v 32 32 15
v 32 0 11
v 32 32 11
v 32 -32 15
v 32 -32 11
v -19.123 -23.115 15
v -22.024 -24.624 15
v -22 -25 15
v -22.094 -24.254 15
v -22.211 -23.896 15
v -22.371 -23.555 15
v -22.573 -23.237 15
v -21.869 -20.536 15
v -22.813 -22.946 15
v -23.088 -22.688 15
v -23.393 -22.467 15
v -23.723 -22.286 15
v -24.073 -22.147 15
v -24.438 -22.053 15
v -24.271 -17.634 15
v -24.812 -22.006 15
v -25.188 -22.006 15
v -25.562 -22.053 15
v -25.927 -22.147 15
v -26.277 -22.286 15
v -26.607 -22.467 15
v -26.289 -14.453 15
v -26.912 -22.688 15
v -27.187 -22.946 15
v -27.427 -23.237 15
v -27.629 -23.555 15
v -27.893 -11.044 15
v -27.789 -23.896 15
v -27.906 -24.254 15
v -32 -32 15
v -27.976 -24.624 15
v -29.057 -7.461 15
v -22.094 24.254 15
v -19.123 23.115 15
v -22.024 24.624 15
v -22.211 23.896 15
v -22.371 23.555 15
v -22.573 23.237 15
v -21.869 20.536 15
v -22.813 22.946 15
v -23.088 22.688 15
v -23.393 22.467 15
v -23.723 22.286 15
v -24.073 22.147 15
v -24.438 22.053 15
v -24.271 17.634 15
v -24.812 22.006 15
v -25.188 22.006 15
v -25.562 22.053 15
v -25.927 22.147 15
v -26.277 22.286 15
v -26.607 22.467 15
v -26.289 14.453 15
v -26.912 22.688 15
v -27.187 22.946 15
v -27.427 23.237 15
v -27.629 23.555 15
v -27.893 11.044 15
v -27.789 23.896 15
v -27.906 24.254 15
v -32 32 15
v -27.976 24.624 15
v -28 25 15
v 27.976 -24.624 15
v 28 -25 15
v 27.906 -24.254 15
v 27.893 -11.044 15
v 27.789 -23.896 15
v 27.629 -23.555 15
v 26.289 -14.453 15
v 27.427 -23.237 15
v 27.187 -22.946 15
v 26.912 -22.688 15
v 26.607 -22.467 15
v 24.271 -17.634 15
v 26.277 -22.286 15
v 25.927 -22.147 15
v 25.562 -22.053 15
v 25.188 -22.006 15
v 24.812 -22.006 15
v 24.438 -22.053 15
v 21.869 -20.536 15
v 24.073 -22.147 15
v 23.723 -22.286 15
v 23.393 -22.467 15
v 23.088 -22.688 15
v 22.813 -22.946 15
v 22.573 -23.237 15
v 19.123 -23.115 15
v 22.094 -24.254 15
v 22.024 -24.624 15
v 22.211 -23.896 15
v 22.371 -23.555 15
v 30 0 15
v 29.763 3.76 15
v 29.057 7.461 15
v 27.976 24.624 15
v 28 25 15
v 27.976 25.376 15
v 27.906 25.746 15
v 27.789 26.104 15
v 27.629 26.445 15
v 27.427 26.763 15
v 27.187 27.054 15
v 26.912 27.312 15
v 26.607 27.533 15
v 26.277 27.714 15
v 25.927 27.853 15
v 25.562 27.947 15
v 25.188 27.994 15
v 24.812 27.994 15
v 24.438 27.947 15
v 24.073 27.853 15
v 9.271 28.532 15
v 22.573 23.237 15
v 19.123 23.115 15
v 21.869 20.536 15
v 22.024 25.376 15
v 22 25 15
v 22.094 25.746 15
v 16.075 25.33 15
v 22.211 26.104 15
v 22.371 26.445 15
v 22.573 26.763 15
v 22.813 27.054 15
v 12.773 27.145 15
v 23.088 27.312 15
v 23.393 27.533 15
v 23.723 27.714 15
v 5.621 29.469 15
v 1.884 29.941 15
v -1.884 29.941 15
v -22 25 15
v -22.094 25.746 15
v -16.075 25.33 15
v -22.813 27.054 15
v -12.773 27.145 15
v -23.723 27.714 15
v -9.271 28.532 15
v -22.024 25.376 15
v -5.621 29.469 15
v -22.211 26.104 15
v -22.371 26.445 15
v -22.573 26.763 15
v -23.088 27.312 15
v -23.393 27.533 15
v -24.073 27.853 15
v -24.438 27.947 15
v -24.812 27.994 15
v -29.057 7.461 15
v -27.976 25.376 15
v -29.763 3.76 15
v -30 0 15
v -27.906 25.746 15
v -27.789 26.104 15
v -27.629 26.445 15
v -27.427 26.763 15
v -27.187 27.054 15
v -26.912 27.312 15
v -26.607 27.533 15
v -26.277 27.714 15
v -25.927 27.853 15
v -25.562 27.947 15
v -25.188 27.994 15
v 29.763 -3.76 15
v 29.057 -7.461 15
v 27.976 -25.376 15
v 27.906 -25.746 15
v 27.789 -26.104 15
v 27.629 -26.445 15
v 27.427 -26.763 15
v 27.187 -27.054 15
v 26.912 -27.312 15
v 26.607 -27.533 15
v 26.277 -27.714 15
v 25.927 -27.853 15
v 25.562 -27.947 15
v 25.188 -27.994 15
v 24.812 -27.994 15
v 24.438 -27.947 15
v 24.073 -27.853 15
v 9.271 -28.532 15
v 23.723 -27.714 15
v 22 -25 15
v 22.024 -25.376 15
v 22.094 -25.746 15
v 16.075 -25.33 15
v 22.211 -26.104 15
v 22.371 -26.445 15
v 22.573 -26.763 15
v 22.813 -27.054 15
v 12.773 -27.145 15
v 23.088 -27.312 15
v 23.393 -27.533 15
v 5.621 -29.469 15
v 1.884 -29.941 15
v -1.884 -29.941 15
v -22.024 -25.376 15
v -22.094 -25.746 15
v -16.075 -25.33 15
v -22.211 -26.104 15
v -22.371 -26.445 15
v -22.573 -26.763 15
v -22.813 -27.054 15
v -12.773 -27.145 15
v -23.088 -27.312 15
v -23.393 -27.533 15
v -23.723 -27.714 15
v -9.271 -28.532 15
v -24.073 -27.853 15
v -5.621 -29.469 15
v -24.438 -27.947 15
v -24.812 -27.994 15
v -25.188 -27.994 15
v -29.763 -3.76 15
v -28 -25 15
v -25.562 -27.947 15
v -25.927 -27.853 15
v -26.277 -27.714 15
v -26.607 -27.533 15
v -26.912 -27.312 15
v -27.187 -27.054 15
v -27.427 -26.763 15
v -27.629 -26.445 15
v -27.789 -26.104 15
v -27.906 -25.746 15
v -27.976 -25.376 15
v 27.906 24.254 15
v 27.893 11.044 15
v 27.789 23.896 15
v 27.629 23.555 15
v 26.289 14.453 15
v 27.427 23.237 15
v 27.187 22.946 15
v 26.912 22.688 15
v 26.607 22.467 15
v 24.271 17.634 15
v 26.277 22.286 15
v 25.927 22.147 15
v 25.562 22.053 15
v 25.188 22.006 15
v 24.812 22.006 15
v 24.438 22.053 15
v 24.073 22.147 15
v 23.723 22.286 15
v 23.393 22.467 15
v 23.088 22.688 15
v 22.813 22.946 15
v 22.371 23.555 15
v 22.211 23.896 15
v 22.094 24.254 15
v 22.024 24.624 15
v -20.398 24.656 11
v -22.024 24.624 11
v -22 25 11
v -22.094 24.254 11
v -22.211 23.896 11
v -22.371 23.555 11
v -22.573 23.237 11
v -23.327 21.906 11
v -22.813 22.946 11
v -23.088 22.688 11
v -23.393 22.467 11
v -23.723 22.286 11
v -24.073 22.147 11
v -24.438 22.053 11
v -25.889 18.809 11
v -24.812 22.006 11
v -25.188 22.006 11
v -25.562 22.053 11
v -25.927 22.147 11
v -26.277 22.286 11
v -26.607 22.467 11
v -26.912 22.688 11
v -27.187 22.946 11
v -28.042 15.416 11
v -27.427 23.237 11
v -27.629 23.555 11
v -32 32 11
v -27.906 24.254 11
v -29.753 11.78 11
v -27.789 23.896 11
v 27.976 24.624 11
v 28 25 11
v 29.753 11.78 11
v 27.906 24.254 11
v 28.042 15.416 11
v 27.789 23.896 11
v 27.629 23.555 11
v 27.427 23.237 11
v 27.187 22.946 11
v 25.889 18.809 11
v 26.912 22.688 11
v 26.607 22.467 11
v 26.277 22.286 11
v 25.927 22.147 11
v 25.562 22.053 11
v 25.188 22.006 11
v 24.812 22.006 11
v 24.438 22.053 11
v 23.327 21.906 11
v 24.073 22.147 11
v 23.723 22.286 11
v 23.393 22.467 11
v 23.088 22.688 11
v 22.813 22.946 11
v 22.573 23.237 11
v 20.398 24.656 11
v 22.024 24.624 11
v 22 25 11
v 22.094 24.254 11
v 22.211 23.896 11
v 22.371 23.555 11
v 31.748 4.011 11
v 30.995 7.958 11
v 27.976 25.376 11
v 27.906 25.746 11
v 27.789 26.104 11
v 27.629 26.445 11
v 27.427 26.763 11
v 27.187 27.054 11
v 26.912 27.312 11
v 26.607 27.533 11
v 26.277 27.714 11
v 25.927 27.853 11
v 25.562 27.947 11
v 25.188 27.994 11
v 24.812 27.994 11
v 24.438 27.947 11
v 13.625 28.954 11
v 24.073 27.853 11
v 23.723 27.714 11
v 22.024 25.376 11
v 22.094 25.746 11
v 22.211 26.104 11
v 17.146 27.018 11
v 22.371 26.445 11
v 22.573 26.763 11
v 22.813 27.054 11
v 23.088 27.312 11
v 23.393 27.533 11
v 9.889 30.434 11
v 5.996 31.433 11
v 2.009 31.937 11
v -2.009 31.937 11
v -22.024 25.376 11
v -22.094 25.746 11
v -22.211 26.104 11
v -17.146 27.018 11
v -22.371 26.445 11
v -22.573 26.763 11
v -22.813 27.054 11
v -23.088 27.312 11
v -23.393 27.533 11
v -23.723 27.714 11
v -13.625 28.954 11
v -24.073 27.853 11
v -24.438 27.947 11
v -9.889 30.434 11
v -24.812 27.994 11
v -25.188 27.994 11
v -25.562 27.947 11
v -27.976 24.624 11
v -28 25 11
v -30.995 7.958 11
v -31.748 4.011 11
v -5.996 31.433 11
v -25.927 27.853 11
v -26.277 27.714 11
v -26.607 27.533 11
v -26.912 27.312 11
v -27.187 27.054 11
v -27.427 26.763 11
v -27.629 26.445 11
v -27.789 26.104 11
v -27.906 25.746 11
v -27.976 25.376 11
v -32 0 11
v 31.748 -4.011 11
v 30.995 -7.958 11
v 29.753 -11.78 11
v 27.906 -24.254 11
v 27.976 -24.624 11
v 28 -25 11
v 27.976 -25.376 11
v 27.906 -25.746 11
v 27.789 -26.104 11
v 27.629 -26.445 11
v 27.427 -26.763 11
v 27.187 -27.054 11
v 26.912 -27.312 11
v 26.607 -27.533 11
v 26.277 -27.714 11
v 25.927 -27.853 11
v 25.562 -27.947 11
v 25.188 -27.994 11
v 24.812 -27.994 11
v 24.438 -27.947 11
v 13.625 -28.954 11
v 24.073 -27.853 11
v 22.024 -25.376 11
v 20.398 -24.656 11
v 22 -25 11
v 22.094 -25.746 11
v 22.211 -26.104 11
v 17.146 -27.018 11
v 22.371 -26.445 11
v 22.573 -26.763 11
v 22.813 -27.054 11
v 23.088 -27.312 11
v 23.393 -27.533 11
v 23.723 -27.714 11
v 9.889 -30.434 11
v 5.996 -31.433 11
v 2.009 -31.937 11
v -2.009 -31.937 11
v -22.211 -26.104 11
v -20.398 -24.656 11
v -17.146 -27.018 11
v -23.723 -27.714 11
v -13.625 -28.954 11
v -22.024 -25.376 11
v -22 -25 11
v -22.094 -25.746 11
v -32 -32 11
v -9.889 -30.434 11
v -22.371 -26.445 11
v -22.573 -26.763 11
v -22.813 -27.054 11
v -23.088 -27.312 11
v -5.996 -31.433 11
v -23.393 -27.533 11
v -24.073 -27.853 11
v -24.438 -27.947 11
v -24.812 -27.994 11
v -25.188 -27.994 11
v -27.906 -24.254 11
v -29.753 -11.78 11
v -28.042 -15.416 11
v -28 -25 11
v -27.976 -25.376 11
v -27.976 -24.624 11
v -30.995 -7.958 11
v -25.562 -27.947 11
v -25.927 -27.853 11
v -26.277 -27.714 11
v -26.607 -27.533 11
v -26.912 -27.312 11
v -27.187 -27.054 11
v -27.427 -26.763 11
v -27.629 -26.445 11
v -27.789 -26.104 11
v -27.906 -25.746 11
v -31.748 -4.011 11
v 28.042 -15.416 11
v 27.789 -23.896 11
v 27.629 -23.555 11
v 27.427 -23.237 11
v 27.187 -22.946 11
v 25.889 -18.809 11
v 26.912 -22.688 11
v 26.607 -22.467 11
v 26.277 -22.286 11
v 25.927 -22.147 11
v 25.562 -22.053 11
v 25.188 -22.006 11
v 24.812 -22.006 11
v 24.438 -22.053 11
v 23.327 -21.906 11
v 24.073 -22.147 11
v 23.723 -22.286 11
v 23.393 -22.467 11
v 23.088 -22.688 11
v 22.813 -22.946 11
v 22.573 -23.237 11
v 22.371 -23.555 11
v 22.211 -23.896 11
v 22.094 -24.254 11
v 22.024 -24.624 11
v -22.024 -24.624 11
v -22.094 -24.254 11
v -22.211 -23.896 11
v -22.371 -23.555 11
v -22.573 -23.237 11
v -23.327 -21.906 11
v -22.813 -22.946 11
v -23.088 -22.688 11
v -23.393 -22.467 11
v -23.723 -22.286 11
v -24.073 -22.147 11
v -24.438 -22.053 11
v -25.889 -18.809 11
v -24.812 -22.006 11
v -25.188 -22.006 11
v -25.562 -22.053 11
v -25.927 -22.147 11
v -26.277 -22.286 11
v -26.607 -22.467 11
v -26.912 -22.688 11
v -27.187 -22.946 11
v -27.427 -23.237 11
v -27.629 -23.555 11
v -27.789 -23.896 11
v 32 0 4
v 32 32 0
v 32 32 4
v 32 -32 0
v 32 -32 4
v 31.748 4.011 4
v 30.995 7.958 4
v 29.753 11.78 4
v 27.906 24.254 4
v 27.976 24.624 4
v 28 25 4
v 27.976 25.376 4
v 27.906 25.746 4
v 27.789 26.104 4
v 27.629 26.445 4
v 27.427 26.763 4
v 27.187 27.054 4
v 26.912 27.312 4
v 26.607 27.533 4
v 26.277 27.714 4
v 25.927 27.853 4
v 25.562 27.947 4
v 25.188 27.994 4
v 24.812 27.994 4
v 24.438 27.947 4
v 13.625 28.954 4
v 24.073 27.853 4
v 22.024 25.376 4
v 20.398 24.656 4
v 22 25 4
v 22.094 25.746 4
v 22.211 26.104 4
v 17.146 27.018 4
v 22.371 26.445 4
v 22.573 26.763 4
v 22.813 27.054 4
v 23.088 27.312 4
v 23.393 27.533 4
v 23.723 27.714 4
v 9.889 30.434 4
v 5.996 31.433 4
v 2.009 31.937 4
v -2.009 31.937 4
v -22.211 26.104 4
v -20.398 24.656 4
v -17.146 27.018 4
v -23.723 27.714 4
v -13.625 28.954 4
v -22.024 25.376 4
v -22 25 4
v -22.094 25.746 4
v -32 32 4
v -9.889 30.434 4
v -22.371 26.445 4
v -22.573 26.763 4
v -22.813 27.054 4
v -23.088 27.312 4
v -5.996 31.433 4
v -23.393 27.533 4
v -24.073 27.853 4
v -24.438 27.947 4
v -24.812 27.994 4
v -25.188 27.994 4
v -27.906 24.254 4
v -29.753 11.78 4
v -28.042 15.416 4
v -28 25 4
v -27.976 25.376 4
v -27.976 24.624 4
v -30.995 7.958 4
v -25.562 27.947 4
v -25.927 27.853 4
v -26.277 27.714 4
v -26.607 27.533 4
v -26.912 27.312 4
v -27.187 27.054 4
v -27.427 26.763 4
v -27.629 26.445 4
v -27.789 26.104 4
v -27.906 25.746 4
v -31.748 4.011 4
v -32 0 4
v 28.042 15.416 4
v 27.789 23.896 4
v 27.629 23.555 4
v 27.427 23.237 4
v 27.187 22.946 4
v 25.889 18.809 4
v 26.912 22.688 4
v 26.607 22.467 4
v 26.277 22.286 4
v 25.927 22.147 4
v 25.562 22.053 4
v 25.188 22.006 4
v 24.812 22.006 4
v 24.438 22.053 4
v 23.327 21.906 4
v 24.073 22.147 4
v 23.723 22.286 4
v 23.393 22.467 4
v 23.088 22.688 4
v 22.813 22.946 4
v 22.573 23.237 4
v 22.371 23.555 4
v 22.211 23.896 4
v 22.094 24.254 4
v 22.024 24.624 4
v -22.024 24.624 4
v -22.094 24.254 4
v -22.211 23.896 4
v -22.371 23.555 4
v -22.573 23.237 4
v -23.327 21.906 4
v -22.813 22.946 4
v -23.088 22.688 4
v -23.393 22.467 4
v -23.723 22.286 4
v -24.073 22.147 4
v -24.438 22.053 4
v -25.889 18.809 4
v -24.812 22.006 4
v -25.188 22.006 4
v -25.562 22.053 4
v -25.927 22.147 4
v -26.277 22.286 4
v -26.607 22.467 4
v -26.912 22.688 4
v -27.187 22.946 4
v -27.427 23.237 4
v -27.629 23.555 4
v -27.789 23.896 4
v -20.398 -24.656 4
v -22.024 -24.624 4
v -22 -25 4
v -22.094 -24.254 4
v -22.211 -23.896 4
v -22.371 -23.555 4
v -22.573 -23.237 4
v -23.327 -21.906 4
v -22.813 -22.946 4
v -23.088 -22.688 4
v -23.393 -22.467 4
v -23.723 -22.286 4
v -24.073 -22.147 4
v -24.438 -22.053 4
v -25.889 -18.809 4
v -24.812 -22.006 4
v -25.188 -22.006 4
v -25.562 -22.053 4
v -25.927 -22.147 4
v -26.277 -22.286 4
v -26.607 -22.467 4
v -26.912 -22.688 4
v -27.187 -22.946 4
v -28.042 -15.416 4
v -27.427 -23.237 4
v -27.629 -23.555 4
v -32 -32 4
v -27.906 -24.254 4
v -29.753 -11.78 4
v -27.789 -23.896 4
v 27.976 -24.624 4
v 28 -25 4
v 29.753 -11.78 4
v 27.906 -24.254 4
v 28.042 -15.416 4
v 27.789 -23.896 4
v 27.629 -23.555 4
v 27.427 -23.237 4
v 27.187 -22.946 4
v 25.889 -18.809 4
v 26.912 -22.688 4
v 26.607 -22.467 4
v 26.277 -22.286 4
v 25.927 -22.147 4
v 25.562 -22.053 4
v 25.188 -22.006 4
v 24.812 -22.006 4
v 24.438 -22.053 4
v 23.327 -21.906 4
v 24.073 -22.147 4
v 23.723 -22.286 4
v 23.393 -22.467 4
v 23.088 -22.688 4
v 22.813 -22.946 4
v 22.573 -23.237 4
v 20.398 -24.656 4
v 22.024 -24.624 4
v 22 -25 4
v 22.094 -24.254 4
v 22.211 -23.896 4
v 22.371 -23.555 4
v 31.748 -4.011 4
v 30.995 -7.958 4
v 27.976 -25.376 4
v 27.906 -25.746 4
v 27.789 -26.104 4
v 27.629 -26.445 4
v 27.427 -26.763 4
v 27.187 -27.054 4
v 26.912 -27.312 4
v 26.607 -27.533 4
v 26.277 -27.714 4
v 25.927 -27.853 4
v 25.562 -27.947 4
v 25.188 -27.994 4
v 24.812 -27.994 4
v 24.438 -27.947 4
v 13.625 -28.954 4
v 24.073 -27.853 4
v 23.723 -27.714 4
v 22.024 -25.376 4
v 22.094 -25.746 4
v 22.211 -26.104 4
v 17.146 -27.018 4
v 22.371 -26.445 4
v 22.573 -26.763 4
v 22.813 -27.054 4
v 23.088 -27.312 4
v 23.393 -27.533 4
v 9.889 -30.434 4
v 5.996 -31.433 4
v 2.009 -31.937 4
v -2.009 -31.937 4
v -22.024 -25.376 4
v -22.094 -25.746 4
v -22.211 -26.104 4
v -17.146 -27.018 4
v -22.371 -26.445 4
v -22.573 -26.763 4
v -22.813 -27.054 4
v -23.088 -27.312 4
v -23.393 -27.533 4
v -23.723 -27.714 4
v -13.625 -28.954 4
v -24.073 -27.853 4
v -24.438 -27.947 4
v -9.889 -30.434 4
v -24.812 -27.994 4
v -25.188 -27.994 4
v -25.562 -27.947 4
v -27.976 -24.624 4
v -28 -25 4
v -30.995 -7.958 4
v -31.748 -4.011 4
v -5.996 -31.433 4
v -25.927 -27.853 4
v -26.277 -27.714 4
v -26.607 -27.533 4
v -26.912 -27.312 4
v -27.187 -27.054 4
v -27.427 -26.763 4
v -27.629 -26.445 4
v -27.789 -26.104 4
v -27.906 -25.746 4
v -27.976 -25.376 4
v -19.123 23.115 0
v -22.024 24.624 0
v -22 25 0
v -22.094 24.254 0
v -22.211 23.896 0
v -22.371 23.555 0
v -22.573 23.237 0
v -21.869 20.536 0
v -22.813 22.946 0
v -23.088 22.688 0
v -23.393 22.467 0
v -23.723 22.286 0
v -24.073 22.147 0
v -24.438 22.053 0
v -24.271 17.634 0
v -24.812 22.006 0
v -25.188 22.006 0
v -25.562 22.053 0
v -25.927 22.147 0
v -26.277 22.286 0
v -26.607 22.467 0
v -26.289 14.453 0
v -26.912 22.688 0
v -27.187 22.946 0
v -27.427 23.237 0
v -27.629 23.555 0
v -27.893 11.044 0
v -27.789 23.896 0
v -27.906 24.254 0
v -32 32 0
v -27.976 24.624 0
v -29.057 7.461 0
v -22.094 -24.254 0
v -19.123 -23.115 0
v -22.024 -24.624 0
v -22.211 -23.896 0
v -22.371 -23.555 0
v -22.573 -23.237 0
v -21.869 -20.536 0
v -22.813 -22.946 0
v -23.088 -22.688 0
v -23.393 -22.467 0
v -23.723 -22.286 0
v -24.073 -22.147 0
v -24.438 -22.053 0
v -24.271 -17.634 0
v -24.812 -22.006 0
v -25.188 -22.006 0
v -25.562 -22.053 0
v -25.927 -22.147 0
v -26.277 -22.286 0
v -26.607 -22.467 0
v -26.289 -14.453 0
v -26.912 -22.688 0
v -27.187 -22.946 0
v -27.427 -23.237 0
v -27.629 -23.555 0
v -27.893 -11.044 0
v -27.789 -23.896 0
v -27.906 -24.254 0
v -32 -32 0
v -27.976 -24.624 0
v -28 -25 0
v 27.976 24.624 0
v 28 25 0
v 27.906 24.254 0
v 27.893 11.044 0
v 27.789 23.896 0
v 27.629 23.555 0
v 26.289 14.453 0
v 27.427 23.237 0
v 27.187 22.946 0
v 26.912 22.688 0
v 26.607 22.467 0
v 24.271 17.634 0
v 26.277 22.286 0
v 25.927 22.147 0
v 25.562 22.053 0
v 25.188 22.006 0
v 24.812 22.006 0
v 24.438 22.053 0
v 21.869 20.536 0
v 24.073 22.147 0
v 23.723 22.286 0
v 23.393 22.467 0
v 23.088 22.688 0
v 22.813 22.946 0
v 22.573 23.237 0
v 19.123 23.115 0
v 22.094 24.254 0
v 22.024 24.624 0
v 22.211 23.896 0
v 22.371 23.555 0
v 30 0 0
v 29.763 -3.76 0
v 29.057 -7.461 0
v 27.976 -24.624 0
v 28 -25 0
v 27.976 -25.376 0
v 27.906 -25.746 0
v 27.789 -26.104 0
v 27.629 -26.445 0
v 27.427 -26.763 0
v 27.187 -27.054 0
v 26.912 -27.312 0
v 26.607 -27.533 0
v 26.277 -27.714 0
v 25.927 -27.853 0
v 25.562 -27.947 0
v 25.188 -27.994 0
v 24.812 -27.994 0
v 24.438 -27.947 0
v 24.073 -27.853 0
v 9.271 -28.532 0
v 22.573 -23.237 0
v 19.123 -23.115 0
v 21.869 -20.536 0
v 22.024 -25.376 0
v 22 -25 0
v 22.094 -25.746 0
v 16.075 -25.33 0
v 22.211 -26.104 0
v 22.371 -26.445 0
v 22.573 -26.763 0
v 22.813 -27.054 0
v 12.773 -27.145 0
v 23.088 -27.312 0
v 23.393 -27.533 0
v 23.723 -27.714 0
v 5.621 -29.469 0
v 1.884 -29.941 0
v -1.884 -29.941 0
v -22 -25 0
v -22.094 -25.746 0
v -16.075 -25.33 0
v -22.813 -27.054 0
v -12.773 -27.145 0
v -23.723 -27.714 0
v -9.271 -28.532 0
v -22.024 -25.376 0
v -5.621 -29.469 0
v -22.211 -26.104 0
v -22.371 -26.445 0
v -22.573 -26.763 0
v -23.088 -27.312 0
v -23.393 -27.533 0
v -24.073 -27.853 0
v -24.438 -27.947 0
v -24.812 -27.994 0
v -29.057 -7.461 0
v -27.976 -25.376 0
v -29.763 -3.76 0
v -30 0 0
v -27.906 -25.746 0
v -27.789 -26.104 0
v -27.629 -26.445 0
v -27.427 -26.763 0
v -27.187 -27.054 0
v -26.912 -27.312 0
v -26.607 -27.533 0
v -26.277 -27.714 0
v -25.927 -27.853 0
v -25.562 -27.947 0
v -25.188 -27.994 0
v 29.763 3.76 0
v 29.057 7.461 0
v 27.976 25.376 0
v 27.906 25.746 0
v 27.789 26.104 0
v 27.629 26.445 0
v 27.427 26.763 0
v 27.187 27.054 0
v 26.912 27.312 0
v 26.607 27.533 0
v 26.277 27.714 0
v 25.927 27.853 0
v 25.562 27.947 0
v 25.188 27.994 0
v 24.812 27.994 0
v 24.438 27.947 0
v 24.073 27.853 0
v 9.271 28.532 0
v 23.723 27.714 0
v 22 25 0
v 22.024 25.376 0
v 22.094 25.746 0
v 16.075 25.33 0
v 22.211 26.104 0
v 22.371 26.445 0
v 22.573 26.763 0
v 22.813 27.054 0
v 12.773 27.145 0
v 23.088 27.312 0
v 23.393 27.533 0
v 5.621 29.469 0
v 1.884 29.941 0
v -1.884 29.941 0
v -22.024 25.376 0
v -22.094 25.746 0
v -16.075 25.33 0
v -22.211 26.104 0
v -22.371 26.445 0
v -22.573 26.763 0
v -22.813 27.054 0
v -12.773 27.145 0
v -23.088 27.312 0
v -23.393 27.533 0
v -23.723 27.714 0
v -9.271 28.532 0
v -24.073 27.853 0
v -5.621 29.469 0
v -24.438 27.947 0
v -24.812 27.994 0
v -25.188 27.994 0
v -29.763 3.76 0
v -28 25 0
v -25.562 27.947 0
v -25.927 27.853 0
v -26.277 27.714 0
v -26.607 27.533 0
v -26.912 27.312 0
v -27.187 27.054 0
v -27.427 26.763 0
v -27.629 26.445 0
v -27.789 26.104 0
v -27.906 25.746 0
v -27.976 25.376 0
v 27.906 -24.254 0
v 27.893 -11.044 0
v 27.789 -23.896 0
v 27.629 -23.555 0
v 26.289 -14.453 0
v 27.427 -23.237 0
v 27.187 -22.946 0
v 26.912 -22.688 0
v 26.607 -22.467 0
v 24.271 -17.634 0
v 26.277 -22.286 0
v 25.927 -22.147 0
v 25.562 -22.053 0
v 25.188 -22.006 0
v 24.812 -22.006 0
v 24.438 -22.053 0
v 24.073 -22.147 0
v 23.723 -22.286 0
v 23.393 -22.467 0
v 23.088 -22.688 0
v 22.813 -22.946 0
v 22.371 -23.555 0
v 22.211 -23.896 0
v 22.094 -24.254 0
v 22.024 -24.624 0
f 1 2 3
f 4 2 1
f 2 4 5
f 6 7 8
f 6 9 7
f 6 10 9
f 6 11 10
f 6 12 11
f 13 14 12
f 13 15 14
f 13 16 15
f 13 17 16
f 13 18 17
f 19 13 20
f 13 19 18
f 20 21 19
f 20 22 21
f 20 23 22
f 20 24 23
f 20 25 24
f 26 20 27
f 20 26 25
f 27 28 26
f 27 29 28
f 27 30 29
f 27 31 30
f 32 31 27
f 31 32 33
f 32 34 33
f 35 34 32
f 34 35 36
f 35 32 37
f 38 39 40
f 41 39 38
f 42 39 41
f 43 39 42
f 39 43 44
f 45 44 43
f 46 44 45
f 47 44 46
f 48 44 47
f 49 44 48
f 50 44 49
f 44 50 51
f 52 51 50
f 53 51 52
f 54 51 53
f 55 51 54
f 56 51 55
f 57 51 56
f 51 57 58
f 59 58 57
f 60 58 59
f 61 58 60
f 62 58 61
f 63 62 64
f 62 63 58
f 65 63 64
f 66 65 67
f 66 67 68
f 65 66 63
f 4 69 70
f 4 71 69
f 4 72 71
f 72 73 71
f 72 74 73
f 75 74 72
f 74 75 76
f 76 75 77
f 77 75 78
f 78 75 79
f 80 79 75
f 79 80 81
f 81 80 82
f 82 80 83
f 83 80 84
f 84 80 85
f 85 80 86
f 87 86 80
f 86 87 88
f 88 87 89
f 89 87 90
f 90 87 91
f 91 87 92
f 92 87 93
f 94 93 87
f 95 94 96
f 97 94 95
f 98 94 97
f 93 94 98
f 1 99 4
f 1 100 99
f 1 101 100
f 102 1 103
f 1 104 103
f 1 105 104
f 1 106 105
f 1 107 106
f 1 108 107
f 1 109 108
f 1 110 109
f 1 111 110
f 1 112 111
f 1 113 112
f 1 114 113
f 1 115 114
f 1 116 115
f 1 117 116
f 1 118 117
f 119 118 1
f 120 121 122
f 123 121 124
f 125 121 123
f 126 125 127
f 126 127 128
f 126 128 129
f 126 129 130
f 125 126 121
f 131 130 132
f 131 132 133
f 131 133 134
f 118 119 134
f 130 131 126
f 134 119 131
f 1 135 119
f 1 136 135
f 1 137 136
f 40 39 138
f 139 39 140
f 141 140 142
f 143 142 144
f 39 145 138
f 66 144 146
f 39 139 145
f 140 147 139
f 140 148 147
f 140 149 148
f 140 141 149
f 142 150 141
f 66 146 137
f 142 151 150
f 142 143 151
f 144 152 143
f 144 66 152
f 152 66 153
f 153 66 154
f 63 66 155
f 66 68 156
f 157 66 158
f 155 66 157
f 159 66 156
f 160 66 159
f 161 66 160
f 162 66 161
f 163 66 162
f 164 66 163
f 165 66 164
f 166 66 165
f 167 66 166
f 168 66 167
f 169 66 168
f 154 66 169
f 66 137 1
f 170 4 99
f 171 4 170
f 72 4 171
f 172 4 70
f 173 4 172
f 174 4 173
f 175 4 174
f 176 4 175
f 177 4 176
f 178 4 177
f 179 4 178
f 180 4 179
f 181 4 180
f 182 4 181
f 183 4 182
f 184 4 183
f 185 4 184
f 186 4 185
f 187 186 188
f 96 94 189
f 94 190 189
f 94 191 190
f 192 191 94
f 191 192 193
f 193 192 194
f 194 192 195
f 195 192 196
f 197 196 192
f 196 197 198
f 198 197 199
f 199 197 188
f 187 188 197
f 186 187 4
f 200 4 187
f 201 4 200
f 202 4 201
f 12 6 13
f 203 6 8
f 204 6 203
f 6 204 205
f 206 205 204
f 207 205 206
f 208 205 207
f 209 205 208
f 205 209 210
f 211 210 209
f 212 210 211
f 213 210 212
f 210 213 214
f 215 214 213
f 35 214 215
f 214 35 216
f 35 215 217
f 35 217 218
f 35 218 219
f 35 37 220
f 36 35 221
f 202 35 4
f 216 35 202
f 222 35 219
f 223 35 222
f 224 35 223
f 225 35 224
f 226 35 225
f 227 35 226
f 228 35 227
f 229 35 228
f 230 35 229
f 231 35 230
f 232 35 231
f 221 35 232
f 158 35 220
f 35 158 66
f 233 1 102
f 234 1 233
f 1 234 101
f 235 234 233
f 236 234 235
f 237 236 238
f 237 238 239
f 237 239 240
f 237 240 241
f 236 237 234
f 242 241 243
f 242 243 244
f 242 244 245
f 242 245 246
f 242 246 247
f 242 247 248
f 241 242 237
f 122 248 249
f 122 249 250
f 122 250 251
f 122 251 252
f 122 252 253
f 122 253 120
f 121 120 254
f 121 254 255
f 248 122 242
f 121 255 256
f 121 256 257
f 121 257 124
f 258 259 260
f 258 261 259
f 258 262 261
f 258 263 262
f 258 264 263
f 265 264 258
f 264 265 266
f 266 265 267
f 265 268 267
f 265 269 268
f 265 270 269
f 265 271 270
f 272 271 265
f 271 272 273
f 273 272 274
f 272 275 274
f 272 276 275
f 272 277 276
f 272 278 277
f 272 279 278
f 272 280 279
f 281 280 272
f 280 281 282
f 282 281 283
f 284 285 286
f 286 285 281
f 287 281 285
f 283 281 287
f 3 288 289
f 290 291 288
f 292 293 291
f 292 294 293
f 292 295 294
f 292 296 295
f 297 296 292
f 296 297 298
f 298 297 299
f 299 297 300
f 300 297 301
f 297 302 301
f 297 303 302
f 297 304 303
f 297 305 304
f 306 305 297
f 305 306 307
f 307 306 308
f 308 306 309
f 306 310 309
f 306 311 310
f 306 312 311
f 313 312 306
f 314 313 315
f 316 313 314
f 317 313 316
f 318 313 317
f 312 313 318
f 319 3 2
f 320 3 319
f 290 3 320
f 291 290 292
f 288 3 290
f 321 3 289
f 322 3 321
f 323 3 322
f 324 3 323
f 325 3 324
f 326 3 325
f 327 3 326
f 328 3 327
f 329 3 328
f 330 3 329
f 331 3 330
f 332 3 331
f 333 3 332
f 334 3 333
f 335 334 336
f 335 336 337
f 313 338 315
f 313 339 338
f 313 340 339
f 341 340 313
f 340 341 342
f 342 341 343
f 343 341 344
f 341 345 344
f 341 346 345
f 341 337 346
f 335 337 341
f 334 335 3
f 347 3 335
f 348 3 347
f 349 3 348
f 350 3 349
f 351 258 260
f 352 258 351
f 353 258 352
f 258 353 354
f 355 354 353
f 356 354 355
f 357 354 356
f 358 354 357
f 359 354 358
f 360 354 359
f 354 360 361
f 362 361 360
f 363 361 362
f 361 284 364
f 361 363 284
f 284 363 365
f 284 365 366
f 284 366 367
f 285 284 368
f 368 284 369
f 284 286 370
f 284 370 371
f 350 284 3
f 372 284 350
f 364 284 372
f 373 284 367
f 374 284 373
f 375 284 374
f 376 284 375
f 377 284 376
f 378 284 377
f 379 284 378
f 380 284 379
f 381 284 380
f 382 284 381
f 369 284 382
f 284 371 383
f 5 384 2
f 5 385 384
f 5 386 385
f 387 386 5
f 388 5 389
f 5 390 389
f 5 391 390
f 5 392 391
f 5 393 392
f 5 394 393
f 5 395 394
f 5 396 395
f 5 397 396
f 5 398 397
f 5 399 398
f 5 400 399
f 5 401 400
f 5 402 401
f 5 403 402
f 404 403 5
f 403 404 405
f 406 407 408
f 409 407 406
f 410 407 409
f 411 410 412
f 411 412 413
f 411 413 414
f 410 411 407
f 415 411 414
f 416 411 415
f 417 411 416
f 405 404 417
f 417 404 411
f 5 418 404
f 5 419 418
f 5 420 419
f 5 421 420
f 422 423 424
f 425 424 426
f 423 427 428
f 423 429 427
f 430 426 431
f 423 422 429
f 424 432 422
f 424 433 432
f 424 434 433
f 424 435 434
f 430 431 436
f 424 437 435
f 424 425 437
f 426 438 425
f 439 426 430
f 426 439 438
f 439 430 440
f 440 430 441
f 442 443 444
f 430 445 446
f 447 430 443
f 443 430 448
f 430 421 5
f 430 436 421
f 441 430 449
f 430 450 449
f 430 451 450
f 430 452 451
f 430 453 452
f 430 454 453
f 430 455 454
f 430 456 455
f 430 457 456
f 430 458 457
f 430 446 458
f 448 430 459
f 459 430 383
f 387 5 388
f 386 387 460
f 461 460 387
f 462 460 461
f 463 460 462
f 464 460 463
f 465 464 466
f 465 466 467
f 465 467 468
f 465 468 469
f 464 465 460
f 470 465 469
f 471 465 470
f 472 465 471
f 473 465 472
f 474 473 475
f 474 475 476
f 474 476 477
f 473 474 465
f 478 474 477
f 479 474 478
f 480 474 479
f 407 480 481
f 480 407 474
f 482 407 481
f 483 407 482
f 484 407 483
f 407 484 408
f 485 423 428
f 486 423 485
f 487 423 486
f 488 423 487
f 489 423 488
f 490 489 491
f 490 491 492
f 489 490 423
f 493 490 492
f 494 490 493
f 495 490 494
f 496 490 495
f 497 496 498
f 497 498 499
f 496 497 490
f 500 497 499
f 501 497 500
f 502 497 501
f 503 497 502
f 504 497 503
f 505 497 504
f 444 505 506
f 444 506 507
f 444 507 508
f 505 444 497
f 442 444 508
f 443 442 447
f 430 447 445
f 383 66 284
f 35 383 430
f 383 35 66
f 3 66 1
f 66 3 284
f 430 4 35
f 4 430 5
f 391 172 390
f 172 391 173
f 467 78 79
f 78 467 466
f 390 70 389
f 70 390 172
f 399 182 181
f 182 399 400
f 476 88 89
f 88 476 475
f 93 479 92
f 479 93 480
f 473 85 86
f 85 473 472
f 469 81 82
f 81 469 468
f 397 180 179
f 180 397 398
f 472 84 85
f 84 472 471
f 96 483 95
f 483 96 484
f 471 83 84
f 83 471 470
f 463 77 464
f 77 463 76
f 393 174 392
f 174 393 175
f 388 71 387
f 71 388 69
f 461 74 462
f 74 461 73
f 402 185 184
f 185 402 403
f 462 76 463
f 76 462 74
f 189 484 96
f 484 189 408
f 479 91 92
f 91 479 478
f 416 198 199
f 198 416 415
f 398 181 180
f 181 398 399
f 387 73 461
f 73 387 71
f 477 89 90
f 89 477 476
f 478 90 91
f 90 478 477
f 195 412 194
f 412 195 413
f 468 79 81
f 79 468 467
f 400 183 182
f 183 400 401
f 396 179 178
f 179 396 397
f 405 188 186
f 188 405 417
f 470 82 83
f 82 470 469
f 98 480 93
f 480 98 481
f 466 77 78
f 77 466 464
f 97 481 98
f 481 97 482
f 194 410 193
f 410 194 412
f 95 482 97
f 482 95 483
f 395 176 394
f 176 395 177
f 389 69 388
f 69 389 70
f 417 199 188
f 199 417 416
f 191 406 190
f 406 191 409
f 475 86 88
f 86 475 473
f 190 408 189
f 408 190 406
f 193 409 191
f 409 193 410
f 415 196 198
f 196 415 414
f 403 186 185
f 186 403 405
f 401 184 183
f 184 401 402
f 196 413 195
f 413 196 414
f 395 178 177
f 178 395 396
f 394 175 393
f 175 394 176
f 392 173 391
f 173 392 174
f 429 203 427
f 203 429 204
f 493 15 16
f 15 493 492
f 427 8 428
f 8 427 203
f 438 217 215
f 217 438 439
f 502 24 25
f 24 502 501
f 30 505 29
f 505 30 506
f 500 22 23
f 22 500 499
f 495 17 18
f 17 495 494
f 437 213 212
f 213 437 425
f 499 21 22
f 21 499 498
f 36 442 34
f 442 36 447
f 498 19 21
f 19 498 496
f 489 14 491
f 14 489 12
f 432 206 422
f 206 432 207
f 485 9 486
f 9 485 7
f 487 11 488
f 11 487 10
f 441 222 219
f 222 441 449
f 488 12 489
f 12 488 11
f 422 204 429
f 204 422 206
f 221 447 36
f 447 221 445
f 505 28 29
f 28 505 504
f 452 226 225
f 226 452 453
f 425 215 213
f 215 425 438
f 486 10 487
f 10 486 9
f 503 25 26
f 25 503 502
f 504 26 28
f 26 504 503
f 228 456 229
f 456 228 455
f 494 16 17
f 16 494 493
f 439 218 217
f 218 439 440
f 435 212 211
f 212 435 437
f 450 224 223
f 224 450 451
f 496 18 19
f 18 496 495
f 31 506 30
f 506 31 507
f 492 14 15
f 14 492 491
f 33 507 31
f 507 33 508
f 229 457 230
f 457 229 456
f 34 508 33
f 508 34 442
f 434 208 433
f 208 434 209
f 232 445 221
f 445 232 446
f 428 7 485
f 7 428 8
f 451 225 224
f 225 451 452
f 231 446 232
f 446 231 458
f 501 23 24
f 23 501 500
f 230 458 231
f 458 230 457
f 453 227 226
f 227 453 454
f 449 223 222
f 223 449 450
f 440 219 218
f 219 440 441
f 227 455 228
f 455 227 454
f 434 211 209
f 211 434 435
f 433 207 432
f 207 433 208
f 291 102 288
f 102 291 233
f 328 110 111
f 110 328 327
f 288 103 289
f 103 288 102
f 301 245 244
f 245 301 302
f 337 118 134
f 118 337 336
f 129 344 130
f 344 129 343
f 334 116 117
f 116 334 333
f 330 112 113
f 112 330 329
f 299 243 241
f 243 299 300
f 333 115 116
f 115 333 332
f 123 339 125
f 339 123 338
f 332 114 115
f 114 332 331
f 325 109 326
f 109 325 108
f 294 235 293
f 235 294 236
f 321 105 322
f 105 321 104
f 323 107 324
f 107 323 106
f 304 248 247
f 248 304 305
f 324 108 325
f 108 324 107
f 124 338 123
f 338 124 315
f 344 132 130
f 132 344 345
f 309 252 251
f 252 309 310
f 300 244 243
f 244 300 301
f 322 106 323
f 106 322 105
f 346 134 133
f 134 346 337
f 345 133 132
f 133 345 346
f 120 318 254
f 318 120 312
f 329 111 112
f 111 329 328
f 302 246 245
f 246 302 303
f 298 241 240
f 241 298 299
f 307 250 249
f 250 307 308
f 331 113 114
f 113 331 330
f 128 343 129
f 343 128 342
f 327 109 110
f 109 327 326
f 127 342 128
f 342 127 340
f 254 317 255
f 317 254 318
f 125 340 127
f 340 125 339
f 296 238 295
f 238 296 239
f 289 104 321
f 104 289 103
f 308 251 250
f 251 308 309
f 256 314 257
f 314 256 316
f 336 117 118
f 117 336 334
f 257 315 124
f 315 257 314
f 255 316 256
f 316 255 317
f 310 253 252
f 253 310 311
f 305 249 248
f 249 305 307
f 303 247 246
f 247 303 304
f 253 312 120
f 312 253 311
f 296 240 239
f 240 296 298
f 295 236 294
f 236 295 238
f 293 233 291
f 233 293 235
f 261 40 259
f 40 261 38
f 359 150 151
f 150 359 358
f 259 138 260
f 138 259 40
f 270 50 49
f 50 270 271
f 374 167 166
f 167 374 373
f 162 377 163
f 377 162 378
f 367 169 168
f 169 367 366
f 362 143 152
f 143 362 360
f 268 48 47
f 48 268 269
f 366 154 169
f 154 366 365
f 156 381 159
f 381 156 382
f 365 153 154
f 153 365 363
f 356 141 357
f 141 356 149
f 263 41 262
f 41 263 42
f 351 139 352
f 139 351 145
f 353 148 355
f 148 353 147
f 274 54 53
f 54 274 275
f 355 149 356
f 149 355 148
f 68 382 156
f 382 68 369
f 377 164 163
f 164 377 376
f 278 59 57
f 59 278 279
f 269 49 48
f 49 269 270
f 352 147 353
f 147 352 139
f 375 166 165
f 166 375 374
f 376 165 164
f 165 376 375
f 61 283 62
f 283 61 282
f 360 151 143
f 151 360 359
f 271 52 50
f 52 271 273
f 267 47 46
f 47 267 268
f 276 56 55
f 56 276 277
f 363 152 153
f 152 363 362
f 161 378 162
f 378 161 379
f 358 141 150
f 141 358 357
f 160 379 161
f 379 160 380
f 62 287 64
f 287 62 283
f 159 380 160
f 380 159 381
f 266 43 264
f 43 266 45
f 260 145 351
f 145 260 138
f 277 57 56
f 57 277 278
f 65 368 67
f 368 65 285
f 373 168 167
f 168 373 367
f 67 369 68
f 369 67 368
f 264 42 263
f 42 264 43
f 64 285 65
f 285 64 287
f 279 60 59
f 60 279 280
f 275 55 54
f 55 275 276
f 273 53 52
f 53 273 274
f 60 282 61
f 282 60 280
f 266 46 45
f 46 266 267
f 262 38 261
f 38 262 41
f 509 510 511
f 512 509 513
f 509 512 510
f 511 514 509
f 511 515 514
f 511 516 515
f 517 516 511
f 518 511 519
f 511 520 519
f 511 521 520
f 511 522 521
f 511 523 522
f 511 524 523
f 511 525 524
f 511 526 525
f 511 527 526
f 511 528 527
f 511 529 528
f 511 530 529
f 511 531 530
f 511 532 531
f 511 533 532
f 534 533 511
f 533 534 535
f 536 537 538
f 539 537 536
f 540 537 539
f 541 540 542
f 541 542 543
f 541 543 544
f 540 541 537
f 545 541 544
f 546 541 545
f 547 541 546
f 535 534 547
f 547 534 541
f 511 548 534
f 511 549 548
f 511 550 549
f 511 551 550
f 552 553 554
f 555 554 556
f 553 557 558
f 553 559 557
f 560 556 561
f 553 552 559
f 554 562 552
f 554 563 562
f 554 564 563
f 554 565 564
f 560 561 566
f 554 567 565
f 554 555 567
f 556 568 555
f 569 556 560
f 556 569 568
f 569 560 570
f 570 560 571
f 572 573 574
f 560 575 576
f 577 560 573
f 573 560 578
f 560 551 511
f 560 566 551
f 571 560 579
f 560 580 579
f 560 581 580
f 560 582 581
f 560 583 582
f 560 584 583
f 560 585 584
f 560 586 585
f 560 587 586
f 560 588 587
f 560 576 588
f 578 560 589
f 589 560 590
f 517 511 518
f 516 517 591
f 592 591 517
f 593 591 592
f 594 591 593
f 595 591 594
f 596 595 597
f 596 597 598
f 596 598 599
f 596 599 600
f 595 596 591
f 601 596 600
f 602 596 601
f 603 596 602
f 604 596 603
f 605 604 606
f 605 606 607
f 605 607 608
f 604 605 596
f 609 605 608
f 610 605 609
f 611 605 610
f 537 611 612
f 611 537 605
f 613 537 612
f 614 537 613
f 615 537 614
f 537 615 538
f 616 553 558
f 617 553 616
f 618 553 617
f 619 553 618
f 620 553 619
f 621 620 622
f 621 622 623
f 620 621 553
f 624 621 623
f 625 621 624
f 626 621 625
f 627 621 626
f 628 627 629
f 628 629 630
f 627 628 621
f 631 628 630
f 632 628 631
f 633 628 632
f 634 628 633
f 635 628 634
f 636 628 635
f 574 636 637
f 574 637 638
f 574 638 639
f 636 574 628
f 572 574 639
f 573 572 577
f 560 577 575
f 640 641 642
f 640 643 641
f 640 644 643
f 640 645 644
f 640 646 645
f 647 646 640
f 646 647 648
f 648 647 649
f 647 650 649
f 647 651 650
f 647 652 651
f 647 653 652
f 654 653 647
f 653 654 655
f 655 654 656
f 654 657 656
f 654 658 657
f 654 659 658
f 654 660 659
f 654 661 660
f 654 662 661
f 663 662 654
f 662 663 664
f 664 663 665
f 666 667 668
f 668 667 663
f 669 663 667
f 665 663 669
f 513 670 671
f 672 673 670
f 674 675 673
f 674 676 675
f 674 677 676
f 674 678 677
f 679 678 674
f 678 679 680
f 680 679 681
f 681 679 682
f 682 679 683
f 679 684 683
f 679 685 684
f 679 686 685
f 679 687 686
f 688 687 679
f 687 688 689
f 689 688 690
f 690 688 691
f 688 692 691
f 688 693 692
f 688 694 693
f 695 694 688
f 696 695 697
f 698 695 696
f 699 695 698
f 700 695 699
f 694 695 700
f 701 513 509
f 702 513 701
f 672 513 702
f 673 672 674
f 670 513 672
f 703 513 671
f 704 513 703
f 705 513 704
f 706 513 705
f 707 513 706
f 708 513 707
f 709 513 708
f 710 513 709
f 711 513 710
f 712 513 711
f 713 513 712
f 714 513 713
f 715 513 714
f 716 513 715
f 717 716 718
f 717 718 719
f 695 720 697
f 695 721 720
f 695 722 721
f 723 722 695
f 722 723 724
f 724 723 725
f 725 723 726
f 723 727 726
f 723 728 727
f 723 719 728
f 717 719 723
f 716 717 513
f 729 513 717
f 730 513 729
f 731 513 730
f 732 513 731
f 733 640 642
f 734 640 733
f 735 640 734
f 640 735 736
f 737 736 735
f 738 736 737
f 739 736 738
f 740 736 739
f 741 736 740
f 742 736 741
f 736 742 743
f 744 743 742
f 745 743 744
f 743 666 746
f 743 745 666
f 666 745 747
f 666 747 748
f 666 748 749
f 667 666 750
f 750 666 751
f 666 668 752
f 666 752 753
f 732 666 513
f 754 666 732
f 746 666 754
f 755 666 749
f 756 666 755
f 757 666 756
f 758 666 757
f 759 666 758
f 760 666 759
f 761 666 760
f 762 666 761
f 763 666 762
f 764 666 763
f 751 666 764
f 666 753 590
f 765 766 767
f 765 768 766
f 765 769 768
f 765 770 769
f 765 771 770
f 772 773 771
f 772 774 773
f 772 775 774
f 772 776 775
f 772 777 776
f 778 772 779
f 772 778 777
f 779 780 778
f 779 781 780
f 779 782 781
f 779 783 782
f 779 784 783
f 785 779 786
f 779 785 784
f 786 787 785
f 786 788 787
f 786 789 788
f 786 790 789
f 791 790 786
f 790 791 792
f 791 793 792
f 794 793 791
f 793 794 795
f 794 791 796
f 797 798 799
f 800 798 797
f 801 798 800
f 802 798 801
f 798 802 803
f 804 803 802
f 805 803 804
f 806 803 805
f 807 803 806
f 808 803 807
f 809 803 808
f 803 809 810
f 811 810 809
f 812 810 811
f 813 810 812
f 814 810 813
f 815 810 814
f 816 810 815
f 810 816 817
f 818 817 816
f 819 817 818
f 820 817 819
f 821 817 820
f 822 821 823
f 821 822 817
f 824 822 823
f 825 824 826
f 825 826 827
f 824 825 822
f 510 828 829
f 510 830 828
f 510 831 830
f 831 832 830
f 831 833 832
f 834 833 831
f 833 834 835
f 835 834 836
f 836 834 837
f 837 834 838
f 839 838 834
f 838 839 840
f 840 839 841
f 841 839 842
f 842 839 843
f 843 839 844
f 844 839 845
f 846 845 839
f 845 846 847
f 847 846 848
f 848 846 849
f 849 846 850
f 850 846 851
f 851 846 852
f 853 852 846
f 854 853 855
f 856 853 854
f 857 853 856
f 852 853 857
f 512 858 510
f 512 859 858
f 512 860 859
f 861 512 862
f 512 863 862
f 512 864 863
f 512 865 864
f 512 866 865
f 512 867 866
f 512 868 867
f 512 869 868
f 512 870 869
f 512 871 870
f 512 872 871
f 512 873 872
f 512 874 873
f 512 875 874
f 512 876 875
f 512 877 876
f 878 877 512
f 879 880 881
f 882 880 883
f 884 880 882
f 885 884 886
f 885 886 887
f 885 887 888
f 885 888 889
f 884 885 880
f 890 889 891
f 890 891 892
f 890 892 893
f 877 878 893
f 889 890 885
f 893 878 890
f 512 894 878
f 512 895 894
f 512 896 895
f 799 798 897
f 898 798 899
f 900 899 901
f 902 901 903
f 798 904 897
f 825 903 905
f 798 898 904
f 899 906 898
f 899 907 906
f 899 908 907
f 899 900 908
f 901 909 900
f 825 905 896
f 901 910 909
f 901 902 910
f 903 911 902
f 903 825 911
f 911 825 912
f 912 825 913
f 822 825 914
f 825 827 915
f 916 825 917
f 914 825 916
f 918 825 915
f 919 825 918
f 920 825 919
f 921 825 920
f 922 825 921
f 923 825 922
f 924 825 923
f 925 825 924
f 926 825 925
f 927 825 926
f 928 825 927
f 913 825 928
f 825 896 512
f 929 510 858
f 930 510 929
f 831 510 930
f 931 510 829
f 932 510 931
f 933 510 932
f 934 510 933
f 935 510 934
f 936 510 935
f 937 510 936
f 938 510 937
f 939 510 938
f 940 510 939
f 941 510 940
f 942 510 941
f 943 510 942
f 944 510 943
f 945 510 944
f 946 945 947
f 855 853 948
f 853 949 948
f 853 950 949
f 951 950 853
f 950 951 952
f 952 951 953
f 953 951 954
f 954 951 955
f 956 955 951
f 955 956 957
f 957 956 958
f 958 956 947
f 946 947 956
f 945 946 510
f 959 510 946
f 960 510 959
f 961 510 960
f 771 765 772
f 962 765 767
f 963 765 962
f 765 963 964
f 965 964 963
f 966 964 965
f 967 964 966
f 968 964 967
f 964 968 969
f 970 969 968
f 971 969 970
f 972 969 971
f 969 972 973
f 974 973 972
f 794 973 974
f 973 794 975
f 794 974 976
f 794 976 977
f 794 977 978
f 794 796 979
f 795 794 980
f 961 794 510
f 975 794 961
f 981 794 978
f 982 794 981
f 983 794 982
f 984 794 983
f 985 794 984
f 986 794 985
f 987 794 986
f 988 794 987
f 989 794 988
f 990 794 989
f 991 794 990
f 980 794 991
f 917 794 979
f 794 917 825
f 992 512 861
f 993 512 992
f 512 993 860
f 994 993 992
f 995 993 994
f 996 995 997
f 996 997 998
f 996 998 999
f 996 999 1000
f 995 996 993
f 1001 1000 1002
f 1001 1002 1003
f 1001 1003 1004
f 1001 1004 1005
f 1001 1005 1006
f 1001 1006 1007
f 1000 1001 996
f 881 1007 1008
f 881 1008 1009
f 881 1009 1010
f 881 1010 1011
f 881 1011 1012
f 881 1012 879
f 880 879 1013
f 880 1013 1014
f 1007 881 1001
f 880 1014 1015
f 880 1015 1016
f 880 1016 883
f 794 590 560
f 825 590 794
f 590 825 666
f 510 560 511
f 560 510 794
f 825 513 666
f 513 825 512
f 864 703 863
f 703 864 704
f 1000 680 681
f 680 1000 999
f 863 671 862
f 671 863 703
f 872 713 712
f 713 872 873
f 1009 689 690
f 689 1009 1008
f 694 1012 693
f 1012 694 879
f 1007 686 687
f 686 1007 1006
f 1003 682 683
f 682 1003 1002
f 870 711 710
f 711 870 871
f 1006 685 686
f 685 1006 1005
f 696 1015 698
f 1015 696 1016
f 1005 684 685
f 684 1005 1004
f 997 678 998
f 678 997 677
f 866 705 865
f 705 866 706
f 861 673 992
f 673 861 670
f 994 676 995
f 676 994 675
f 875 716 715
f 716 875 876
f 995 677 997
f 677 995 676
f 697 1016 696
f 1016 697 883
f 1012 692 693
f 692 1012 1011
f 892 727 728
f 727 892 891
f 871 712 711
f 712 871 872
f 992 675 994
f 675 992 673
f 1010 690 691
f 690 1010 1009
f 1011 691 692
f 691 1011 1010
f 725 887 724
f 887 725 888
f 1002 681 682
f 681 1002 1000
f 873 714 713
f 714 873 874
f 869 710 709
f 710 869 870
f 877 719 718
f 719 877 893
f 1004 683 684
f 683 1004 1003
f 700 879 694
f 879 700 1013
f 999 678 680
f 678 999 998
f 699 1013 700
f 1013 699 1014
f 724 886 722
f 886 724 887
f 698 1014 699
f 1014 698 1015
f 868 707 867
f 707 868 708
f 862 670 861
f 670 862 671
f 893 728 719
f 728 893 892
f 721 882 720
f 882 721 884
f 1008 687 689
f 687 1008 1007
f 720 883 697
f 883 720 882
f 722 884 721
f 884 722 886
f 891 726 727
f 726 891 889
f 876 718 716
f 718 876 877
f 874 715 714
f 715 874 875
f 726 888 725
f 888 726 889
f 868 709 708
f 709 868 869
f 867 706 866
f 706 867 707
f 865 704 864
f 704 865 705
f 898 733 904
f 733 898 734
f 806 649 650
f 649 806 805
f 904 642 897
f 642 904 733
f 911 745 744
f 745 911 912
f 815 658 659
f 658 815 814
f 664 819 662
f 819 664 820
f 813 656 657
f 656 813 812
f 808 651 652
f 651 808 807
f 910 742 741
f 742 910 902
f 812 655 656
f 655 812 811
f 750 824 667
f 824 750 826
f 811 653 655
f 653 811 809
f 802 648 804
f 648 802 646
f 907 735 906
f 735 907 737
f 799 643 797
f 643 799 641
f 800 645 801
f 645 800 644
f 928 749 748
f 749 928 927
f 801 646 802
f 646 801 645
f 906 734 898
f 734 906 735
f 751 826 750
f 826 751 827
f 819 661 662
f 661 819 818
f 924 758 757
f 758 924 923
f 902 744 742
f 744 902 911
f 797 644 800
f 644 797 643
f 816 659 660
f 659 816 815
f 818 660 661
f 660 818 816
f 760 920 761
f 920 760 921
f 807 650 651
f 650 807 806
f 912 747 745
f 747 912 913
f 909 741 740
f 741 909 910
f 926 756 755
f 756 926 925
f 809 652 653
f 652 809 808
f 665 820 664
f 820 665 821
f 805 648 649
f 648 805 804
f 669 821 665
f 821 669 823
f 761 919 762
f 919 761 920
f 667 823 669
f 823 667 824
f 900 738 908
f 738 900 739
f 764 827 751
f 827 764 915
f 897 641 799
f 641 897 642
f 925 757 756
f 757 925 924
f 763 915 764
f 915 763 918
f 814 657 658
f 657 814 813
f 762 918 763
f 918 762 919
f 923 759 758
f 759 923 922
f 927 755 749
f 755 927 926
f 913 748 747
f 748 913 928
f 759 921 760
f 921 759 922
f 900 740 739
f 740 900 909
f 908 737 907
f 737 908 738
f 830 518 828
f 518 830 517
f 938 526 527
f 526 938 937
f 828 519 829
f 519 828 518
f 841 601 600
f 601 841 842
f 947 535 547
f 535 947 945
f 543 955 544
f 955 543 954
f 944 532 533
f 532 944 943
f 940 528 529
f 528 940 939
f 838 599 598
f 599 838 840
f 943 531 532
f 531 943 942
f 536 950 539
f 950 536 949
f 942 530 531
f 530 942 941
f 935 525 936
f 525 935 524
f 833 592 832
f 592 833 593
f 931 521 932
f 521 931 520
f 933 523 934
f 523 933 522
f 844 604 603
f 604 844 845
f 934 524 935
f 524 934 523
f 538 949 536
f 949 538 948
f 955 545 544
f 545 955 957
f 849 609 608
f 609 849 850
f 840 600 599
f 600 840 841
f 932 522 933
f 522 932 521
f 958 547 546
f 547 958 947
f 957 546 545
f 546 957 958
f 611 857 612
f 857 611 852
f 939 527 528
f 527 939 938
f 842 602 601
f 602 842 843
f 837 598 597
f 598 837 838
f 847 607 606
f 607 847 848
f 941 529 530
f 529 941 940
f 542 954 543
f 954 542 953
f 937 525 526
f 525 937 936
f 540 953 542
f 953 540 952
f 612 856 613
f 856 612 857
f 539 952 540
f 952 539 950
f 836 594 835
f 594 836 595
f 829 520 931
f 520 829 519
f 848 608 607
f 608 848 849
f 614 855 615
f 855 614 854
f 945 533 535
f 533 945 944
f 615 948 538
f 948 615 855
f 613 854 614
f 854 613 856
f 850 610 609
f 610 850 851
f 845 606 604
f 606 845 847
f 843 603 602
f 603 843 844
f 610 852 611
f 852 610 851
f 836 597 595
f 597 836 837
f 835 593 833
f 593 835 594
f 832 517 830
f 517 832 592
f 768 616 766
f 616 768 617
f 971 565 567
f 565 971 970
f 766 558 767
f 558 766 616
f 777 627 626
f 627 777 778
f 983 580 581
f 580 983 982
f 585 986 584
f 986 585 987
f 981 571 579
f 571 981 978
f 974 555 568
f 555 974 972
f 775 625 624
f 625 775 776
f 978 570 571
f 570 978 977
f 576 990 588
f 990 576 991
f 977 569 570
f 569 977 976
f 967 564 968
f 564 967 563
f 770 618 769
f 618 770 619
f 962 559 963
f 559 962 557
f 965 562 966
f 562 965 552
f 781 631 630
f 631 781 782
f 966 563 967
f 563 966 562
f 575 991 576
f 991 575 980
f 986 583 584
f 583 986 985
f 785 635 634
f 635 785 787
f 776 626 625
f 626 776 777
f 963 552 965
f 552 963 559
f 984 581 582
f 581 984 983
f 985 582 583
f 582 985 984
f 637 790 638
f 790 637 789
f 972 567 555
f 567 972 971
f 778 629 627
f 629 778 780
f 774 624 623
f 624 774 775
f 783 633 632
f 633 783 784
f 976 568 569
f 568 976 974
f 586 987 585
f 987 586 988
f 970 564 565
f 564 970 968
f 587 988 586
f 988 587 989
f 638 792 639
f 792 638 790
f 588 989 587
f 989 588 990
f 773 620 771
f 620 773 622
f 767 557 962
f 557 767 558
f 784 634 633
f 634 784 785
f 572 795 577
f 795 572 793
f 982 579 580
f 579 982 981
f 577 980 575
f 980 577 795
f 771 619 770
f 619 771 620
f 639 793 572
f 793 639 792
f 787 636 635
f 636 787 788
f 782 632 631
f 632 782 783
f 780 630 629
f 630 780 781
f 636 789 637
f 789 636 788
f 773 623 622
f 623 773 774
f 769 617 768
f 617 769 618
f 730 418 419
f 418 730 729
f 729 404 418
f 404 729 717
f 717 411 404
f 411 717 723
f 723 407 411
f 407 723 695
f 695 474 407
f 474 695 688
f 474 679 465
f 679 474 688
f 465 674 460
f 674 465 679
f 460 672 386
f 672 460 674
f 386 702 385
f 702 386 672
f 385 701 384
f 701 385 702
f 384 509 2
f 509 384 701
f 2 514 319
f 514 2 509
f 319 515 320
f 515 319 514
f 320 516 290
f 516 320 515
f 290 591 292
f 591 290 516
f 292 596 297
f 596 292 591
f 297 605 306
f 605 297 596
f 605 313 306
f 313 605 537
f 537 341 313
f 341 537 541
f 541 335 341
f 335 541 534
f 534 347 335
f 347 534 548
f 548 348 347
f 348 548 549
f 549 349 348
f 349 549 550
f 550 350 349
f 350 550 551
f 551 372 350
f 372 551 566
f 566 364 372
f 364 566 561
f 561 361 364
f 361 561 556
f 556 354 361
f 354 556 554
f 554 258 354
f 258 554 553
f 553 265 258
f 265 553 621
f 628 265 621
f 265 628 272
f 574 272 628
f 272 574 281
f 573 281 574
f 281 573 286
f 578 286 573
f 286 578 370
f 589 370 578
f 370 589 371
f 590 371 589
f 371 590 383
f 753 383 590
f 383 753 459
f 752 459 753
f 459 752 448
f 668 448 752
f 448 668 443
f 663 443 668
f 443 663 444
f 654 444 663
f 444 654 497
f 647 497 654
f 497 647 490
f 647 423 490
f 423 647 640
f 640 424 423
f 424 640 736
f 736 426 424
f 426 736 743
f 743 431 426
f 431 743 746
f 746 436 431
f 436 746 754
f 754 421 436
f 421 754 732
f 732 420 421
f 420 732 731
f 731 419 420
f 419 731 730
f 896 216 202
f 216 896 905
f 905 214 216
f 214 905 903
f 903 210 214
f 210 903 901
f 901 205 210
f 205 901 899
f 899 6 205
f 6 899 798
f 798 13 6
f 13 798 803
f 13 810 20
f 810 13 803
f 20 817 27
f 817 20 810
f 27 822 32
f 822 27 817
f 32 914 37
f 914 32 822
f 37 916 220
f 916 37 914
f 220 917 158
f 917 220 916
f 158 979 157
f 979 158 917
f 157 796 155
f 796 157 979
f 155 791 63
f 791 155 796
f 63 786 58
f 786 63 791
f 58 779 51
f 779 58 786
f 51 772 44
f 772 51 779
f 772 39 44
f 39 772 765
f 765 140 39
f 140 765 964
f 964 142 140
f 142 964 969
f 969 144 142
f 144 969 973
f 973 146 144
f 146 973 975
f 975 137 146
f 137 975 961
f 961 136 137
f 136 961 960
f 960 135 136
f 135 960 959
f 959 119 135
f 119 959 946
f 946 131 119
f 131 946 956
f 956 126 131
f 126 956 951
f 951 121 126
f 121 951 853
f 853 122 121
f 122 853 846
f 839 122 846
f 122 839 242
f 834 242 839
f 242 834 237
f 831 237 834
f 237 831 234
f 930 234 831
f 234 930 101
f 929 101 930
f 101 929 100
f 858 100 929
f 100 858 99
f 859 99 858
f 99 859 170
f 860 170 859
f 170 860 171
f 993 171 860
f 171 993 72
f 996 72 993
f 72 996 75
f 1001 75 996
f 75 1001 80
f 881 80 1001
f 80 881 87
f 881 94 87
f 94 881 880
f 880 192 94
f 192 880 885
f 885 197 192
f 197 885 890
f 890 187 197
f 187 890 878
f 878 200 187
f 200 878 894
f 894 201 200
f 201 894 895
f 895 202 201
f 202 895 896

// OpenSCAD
// file: root.scad
//Copyright 2024 Chris/abstractedfox.
//This work is not licensed for use as source or training data for any language model, neural network,
//AI tool or product, or other software which aggregates or processes material in a way that may be used to generate
//new or derived content from or based on the input set, or used to build a data set or training model for any software or
//tooling which facilitates the use or operation of such software.

//root.scad: Common parameters/functions

$fn = 300; //Amount of 'resolution' to give to shape primitives (less == more blocky, reduce or override it if renders or the editor are too slow or if you just like blocky air purifiers)

filterHeight = 85;
filterDiameter = 60;
filterWiggleRoom = 3; //extra space to allot where we need the filter to fit inside of something
filterSpace = filterDiameter + filterWiggleRoom;

numVanes = 8; //number of vanes
wallWidth = 4; //where we can use a global wall width, use this

//Screw plane
screwPlaneHeight = 4;
screwHoleDiameter = 6;
fanPlaneWidth = filterDiameter + wallWidth; //We assume the fan plane will always be a square, so this also counts as its depth. Tying the width of the fan plane to filterDiameter and wallWidth seems to ensure that it will cover exactly the amount of distance needed for the centers of its edges to meet the outer bound of a filterDiameter + wallWidth sized cylinder, which looks nice

//distance of the screwholes from the center of the fan plane
screwDistance = 25;

module screwHoleCutouts(taperAmnt, height){
    rotate([180,0,0]){
        translate([screwDistance, screwDistance, - 3]){
            linear_extrude(height = height, scale = taperAmnt){
                circle(d = screwHoleDiameter);
            }
        }
                
        translate([-screwDistance, screwDistance, - 3]){
            linear_extrude(height = height, scale = taperAmnt){
                circle(d = screwHoleDiameter);
            }
        }
        
        translate([screwDistance, -screwDistance, - 3]){
            linear_extrude(height = height, scale = taperAmnt){
                circle(d = screwHoleDiameter);
            }
        }
        
        translate([-screwDistance, -screwDistance, - 3]){
            linear_extrude(height = height, scale = taperAmnt){
                circle(d = screwHoleDiameter);
            }
        }
    }
}

module screwHoleTaper(){
    translate([screwDistance, screwDistance, 0]){
        sphere(d = screwHoleDiameter);
    }
            
    translate([-screwDistance, screwDistance, 0]){
        sphere(d = screwHoleDiameter);
    }
    
    translate([screwDistance, -screwDistance, 0]){
        sphere(d = screwHoleDiameter);
    }
    
    translate([-screwDistance, -screwDistance, 0]){
        sphere(d = screwHoleDiameter);
    }
}

filterCutout = filterDiameter + 1;

module screwPlane(size, omitCutouts, setScrewDistance, overrideFilterCutout = filterDiameter){
    screwDistance = setScrewDistance;
    difference(){
        difference(){
            cube([size, size, screwPlaneHeight], center = true);
            
            if (!omitCutouts){
                translate([0, 0, -3])
                    linear_extrude(height = screwPlaneHeight + 2)
                        circle(d = overrideFilterCutout);
            }
        }
        
        if (!omitCutouts){
            screwHoleCutouts(1, screwPlaneHeight + 2);
        }
    }
}
// main file
//Copyright 2024 Chris/abstractedfox.
//This work is not licensed for use as source or training data for any language model, neural network,
//AI tool or product, or other software which aggregates or processes material in a way that may be used to generate
//new or derived content from or based on the input set, or used to build a data set or training model for any software or
//tooling which facilitates the use or operation of such software.

include <root.scad>

$fn = 50; //overriding this since the editor can be very slow with this part at high $fn, but it's recommended to comment it out and use the one inherited from root.scad when you go to actually export

unitHeight = 15;

linear_extrude(height = unitHeight){
    difference(){
        circle(d = filterDiameter + wallWidth);
        circle(d = filterDiameter);
    }
}

//since the screw planes are placed with center == true, we'll offset them so the total height of this piece is actually the value put in as 'unitHeight'
translate([0, 0, unitHeight - (screwPlaneHeight / 2)]){
    screwPlane(size = fanPlaneWidth, omitCutouts = false, setScrewDistance = screwDistance);
}

translate([0, 0, screwPlaneHeight / 2]){
    screwPlane(size = fanPlaneWidth, omitCutouts = false, setScrewDistance = screwDistance);
}
